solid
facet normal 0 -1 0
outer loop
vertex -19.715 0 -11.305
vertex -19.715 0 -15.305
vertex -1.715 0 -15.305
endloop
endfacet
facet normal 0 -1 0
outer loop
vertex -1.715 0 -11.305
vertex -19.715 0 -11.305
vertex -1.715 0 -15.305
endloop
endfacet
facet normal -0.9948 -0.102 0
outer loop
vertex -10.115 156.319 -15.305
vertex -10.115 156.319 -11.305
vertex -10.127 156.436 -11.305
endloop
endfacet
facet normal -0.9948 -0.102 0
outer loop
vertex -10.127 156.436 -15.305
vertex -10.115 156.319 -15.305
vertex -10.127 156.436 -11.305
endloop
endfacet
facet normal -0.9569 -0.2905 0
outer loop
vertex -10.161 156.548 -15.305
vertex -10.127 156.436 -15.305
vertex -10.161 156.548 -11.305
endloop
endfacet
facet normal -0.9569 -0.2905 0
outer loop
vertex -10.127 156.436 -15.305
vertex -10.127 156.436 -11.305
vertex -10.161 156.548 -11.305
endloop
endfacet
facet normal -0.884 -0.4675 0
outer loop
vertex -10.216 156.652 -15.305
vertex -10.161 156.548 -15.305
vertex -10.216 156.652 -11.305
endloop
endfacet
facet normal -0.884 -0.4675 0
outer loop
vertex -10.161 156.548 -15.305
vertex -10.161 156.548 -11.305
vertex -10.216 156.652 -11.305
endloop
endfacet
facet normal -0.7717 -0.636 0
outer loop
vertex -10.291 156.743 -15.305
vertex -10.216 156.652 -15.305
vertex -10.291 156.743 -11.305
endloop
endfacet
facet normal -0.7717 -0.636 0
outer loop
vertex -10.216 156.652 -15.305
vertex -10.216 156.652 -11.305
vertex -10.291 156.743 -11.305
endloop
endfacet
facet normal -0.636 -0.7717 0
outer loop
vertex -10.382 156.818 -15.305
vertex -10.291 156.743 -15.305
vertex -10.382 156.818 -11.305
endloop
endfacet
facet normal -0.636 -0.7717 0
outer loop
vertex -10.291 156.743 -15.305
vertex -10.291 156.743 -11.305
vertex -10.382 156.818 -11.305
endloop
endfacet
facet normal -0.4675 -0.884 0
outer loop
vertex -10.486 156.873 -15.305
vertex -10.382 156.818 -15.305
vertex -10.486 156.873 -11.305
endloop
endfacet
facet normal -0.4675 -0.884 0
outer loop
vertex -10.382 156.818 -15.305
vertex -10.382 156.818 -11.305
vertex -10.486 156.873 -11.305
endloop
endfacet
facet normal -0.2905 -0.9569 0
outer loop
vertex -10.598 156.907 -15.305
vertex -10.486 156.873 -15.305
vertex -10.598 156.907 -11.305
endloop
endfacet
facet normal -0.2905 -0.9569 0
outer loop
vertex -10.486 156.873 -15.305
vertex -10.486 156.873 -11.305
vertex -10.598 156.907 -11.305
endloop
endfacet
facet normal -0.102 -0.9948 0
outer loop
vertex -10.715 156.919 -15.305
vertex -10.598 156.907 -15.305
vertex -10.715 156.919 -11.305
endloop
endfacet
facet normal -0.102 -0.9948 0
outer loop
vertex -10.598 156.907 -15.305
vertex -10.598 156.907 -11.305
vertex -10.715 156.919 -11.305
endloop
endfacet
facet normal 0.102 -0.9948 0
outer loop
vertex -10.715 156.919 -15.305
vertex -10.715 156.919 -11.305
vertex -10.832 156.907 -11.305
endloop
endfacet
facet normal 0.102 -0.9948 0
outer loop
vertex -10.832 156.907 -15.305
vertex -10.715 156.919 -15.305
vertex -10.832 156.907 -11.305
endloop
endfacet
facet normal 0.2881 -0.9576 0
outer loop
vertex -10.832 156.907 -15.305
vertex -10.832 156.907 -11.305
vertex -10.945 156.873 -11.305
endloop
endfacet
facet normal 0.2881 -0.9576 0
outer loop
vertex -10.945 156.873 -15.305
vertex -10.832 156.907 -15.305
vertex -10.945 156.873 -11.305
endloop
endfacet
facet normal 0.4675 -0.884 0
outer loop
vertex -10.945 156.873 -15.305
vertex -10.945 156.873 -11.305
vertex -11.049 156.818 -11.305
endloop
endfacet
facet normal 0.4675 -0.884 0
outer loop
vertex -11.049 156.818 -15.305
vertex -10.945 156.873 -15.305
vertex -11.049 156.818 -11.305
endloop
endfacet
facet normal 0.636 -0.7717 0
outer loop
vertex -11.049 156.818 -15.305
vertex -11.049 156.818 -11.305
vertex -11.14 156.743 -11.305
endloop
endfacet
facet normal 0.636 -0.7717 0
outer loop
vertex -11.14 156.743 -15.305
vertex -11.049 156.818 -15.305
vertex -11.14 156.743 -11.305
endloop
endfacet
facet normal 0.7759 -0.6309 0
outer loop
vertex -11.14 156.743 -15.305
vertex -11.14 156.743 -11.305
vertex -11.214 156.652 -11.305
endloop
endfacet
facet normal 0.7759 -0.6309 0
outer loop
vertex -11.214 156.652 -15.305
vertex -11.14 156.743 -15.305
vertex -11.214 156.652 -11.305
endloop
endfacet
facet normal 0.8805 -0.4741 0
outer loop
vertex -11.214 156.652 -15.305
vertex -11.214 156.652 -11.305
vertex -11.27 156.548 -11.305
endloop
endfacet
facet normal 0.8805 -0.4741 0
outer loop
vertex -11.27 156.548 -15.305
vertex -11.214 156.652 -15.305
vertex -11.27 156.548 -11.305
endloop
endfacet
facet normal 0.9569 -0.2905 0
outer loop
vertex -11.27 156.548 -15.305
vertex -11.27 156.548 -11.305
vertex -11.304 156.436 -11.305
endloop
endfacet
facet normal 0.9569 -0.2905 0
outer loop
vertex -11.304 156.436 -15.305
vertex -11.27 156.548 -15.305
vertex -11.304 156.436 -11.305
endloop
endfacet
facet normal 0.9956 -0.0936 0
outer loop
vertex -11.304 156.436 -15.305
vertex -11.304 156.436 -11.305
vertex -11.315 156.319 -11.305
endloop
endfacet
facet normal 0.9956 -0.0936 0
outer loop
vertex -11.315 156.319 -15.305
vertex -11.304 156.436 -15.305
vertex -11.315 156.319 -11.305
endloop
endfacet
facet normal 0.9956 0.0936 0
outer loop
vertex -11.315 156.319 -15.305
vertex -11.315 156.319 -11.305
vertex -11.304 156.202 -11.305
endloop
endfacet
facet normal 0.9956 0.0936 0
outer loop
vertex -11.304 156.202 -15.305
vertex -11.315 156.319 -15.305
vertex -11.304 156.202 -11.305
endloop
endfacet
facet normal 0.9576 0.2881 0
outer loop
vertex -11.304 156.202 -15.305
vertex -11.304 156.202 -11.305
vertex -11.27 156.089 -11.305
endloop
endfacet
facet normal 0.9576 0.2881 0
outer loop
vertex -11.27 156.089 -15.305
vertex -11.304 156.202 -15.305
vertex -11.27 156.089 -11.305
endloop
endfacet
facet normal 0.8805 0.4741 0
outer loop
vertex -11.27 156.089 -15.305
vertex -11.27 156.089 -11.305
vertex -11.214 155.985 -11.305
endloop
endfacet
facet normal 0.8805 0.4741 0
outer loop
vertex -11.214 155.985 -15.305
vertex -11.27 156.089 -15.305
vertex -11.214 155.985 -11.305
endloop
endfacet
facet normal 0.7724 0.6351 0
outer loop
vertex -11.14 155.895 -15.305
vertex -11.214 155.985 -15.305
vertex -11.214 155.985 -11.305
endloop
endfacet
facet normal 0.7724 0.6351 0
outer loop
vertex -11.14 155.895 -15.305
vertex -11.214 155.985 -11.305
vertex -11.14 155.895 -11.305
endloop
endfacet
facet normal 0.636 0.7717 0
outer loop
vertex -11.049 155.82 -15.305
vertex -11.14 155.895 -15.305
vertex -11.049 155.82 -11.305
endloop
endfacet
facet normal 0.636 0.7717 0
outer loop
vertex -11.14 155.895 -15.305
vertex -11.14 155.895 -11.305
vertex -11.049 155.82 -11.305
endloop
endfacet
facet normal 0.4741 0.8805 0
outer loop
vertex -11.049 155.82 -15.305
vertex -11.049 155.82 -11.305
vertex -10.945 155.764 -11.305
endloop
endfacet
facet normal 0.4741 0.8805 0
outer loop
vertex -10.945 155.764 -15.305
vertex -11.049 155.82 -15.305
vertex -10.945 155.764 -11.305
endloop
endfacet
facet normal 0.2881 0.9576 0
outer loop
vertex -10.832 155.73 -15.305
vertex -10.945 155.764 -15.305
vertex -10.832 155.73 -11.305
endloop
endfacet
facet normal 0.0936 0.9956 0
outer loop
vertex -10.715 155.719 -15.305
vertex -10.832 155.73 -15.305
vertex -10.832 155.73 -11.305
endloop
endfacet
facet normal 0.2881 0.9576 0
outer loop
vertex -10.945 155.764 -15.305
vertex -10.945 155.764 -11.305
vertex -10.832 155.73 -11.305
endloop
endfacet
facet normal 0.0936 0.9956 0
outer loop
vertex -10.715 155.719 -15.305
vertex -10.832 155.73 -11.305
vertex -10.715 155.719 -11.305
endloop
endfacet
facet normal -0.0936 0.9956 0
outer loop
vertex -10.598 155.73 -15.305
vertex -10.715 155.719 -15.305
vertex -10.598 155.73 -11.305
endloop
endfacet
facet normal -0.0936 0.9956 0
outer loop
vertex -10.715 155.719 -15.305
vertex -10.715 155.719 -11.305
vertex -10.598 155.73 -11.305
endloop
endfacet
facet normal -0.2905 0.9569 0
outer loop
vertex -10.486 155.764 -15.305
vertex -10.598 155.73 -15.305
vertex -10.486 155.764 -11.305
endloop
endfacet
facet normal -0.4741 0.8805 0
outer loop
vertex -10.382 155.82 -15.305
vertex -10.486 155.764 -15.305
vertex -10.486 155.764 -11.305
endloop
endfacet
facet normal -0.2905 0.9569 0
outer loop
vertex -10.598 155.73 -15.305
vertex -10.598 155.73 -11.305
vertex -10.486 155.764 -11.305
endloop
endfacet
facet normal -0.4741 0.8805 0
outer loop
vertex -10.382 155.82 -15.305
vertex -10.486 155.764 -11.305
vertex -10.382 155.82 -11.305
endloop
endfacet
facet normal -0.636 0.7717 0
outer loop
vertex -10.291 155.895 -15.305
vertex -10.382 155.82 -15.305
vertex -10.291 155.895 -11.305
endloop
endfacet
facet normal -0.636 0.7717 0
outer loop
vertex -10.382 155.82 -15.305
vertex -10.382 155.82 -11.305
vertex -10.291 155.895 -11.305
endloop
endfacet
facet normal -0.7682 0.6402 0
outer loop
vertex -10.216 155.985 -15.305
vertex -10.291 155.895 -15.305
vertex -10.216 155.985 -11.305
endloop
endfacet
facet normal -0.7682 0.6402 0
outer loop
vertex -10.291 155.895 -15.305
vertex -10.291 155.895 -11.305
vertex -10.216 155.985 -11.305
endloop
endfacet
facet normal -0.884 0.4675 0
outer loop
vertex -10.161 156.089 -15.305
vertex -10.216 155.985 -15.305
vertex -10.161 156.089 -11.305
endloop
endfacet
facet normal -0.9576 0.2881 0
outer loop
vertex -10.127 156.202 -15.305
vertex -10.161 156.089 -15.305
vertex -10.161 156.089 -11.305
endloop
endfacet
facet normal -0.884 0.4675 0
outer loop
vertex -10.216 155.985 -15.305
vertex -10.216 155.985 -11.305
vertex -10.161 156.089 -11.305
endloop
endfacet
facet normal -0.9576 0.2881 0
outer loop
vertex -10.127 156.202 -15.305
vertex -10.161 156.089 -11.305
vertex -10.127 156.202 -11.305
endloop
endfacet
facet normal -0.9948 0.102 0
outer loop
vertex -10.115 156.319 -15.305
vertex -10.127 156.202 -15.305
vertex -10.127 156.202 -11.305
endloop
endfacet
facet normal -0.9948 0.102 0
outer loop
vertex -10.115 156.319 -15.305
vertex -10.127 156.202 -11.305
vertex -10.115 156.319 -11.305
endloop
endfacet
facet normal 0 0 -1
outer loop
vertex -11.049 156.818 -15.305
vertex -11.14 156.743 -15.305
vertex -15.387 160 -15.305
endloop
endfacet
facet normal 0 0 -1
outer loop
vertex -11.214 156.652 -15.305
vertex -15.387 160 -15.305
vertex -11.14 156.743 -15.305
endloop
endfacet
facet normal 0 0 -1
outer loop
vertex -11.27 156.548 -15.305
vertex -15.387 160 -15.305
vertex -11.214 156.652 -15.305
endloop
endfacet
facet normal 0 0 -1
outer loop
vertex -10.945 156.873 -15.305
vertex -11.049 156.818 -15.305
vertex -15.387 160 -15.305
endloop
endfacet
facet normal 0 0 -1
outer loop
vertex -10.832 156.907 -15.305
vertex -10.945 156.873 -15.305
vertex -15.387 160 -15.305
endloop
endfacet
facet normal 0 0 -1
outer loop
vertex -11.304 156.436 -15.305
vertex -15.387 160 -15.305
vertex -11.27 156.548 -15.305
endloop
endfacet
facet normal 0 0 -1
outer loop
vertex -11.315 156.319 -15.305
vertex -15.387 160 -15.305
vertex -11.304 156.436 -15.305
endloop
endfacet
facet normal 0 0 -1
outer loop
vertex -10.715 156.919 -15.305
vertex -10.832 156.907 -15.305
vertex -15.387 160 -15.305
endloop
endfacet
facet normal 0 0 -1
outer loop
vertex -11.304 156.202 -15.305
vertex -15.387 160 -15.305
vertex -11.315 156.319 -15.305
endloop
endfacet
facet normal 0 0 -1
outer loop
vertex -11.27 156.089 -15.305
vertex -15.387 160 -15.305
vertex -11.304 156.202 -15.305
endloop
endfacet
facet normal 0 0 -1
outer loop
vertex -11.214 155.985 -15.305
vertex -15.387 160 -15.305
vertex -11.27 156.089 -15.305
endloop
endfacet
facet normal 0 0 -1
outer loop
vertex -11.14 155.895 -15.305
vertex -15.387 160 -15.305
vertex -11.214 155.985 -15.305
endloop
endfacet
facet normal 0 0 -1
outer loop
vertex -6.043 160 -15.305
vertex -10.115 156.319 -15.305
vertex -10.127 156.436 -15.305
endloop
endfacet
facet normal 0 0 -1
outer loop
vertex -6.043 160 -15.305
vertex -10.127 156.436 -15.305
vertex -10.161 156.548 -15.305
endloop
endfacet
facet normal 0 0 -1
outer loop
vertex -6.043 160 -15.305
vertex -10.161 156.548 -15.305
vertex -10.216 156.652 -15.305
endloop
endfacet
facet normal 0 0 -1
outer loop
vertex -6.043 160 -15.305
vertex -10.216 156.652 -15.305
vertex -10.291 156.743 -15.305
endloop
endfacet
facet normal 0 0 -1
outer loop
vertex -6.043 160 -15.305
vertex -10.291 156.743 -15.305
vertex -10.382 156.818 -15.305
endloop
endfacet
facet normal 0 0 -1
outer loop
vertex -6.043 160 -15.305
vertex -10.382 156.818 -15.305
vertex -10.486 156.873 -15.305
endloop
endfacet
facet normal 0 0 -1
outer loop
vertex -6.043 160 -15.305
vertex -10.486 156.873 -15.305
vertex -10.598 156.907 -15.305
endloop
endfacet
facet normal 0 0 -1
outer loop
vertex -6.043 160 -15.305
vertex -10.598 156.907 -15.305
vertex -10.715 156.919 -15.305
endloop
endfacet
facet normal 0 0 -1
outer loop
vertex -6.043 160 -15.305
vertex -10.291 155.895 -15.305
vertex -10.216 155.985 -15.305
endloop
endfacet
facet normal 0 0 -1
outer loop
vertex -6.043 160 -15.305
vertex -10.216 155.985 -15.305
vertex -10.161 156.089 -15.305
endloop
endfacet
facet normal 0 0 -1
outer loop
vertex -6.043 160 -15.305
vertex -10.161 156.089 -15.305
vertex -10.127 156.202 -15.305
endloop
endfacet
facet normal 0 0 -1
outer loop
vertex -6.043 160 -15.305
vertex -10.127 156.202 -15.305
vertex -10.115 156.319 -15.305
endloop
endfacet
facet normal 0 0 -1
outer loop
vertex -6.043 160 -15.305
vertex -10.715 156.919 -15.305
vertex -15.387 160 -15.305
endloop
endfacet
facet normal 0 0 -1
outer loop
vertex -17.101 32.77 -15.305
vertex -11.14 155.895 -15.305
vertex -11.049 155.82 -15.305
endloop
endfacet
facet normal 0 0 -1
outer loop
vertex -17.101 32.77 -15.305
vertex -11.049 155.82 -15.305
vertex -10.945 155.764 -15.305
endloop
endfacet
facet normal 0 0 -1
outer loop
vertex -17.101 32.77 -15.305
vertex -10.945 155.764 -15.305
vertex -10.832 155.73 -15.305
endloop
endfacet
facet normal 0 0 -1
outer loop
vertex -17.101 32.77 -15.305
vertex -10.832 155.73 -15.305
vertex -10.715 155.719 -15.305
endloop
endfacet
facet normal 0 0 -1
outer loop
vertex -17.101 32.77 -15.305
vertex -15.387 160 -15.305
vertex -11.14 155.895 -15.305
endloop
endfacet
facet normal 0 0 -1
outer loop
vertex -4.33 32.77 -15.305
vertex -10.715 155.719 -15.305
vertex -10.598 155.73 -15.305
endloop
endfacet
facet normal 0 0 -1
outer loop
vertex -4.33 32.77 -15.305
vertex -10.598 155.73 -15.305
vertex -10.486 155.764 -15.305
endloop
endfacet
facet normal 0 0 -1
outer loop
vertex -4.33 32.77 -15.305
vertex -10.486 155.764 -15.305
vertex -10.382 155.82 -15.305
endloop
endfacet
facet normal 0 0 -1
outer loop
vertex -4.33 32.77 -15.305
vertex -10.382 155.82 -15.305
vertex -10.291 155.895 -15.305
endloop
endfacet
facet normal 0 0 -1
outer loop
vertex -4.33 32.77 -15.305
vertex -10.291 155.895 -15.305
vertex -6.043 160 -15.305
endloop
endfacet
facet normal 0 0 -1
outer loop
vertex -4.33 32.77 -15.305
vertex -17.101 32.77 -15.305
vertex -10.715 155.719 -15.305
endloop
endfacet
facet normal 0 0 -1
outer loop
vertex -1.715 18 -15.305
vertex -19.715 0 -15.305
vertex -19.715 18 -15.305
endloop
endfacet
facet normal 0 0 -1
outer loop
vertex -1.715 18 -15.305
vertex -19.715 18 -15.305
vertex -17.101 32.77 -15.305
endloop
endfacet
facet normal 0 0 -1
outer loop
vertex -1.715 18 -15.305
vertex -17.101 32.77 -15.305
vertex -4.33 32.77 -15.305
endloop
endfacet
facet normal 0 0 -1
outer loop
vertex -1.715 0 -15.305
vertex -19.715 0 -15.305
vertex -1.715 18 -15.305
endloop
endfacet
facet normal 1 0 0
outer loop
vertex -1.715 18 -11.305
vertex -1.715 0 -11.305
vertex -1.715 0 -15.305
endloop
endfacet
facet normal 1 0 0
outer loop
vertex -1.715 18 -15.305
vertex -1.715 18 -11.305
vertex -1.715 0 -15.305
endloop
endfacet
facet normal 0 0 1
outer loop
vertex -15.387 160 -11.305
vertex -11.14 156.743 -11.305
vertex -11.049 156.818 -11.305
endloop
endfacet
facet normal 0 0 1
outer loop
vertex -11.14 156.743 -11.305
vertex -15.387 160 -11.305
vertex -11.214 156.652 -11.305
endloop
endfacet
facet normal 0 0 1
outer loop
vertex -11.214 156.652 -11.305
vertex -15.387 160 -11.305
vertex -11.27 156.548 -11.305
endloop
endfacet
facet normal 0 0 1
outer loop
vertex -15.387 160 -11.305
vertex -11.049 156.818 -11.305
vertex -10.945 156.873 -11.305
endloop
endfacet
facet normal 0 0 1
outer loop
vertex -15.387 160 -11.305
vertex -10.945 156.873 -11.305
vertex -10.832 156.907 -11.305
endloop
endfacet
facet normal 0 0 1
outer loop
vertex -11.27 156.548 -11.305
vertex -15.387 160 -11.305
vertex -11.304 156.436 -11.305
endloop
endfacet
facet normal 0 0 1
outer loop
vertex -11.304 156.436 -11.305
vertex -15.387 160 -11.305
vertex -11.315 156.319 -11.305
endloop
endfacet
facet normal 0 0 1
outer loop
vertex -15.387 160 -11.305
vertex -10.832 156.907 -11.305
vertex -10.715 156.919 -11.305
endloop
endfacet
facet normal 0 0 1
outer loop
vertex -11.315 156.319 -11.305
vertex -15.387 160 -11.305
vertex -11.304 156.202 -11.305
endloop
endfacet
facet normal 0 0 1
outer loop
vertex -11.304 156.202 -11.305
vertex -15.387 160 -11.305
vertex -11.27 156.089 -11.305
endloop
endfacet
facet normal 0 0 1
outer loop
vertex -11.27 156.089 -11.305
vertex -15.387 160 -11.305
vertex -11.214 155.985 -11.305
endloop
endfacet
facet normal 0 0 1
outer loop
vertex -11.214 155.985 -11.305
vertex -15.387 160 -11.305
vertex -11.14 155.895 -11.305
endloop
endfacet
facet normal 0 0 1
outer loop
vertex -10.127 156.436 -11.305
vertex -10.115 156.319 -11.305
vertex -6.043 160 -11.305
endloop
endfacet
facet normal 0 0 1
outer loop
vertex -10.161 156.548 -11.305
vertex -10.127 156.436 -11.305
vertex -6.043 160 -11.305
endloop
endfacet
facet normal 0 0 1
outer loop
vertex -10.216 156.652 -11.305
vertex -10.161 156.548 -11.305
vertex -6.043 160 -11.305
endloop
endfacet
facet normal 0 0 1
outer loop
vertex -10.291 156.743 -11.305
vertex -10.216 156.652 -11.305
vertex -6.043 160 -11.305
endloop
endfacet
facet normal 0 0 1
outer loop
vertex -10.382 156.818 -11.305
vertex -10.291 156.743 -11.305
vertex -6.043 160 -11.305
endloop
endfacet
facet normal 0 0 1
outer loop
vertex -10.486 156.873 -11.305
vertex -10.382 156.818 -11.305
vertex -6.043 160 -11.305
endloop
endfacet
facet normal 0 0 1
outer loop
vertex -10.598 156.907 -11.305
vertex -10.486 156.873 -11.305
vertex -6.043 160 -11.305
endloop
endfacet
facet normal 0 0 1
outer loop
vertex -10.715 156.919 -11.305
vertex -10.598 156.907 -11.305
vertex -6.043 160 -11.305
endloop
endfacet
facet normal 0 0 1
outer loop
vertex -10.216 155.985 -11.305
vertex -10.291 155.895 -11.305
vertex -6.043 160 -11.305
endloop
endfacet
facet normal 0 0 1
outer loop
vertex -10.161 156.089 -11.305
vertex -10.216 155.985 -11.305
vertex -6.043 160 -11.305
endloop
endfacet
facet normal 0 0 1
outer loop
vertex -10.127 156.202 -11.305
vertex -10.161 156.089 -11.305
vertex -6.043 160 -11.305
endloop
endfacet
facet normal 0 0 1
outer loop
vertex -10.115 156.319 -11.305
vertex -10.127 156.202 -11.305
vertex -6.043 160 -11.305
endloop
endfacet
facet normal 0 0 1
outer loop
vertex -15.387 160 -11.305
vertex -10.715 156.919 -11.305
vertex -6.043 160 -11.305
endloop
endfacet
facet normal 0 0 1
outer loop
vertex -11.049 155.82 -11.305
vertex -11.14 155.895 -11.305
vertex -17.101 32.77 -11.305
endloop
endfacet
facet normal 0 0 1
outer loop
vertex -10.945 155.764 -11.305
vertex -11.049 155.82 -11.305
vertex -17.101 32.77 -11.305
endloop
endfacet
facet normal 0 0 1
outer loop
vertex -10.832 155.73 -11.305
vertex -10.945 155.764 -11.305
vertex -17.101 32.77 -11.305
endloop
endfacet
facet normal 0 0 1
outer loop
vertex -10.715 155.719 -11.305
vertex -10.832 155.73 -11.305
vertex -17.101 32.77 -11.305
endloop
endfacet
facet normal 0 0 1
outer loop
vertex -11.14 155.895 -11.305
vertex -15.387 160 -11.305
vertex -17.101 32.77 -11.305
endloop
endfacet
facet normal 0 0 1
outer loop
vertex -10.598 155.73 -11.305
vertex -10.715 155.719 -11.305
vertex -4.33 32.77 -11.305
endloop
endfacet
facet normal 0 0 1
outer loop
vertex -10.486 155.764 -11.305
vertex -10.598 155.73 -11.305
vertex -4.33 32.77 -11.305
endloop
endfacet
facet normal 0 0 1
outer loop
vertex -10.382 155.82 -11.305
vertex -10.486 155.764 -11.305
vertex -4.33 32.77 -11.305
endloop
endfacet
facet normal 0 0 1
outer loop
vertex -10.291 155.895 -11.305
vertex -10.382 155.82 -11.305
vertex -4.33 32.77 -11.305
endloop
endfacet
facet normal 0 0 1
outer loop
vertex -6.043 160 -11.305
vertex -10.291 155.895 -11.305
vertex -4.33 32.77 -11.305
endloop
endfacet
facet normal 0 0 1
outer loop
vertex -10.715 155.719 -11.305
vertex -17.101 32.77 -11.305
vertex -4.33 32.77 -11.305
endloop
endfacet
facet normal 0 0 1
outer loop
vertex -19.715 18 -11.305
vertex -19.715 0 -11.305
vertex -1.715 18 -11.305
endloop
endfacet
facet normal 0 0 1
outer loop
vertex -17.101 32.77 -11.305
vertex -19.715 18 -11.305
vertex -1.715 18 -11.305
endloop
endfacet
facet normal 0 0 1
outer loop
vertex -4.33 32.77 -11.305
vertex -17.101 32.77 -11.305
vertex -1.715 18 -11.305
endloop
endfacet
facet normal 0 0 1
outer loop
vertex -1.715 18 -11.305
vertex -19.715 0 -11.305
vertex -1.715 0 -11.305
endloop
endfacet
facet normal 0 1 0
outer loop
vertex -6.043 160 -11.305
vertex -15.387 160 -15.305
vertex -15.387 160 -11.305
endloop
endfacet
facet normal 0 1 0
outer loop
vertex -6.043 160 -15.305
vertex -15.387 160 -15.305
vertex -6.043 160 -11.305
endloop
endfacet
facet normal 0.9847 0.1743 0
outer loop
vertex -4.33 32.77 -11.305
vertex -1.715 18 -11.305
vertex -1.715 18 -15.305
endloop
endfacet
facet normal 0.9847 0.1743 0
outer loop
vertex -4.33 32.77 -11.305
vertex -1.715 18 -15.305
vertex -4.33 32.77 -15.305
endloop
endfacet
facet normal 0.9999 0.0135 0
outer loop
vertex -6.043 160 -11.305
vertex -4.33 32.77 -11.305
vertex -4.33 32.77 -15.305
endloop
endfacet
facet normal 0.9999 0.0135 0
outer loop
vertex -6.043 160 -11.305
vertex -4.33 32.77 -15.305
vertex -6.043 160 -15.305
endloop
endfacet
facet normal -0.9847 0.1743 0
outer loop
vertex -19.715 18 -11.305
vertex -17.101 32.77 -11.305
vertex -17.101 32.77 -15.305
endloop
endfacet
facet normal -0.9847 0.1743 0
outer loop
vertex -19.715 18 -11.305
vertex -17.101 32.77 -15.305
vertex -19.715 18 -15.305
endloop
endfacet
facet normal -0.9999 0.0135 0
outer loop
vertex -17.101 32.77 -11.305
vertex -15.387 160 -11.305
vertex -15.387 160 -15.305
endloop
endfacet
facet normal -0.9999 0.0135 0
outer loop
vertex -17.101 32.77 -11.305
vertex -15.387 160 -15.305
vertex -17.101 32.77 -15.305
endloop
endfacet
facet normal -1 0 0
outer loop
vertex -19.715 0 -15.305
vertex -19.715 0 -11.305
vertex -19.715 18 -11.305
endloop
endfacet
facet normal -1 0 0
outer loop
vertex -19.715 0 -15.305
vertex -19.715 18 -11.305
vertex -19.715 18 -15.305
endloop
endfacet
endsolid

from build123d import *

# Parameters (mm, degrees)
SKETCH1_W           = 18
SKETCH1_H           = 4
BOSS_EXTRUDE1_DEPTH = 160
CUT_EXTRUDE1_DEPTH  = 160
SKETCH4_R           = 0.6
CUT_EXTRUDE2_DEPTH  = 160


with BuildPart() as part:
    # Sketch1 → Boss-Extrude1 (new body)
    with BuildSketch(Plane(origin=(0, 0, 0), x_dir=(1, 0, 0), z_dir=(0, 1, 0))):
        with Locations((-10.71526709, 13.305460186)):
            Rectangle(SKETCH1_W, SKETCH1_H)
    extrude(amount=BOSS_EXTRUDE1_DEPTH)

    # Sketch2 → Cut-Extrude1 (cut)
    with BuildSketch(Plane.XY):
        Polygon((-19.71526709, 18), (-19.71526709, 160), (-15.387039625, 160), (-17.100597756, 32.770358976), align=None)
        Polygon((-4.329936424, 32.770358976), (-6.043494554, 160), (-1.71526709, 160), (-1.71526709, 18), align=None)
    extrude(amount=-CUT_EXTRUDE1_DEPTH, mode=Mode.SUBTRACT)

    # Sketch4 → Cut-Extrude2 (cut)
    with BuildSketch(Plane.XY):
        with Locations((-10.71526709, 156.318807469)):
            Circle(SKETCH4_R)
    extrude(amount=-CUT_EXTRUDE2_DEPTH, mode=Mode.SUBTRACT)


solid = part.part
